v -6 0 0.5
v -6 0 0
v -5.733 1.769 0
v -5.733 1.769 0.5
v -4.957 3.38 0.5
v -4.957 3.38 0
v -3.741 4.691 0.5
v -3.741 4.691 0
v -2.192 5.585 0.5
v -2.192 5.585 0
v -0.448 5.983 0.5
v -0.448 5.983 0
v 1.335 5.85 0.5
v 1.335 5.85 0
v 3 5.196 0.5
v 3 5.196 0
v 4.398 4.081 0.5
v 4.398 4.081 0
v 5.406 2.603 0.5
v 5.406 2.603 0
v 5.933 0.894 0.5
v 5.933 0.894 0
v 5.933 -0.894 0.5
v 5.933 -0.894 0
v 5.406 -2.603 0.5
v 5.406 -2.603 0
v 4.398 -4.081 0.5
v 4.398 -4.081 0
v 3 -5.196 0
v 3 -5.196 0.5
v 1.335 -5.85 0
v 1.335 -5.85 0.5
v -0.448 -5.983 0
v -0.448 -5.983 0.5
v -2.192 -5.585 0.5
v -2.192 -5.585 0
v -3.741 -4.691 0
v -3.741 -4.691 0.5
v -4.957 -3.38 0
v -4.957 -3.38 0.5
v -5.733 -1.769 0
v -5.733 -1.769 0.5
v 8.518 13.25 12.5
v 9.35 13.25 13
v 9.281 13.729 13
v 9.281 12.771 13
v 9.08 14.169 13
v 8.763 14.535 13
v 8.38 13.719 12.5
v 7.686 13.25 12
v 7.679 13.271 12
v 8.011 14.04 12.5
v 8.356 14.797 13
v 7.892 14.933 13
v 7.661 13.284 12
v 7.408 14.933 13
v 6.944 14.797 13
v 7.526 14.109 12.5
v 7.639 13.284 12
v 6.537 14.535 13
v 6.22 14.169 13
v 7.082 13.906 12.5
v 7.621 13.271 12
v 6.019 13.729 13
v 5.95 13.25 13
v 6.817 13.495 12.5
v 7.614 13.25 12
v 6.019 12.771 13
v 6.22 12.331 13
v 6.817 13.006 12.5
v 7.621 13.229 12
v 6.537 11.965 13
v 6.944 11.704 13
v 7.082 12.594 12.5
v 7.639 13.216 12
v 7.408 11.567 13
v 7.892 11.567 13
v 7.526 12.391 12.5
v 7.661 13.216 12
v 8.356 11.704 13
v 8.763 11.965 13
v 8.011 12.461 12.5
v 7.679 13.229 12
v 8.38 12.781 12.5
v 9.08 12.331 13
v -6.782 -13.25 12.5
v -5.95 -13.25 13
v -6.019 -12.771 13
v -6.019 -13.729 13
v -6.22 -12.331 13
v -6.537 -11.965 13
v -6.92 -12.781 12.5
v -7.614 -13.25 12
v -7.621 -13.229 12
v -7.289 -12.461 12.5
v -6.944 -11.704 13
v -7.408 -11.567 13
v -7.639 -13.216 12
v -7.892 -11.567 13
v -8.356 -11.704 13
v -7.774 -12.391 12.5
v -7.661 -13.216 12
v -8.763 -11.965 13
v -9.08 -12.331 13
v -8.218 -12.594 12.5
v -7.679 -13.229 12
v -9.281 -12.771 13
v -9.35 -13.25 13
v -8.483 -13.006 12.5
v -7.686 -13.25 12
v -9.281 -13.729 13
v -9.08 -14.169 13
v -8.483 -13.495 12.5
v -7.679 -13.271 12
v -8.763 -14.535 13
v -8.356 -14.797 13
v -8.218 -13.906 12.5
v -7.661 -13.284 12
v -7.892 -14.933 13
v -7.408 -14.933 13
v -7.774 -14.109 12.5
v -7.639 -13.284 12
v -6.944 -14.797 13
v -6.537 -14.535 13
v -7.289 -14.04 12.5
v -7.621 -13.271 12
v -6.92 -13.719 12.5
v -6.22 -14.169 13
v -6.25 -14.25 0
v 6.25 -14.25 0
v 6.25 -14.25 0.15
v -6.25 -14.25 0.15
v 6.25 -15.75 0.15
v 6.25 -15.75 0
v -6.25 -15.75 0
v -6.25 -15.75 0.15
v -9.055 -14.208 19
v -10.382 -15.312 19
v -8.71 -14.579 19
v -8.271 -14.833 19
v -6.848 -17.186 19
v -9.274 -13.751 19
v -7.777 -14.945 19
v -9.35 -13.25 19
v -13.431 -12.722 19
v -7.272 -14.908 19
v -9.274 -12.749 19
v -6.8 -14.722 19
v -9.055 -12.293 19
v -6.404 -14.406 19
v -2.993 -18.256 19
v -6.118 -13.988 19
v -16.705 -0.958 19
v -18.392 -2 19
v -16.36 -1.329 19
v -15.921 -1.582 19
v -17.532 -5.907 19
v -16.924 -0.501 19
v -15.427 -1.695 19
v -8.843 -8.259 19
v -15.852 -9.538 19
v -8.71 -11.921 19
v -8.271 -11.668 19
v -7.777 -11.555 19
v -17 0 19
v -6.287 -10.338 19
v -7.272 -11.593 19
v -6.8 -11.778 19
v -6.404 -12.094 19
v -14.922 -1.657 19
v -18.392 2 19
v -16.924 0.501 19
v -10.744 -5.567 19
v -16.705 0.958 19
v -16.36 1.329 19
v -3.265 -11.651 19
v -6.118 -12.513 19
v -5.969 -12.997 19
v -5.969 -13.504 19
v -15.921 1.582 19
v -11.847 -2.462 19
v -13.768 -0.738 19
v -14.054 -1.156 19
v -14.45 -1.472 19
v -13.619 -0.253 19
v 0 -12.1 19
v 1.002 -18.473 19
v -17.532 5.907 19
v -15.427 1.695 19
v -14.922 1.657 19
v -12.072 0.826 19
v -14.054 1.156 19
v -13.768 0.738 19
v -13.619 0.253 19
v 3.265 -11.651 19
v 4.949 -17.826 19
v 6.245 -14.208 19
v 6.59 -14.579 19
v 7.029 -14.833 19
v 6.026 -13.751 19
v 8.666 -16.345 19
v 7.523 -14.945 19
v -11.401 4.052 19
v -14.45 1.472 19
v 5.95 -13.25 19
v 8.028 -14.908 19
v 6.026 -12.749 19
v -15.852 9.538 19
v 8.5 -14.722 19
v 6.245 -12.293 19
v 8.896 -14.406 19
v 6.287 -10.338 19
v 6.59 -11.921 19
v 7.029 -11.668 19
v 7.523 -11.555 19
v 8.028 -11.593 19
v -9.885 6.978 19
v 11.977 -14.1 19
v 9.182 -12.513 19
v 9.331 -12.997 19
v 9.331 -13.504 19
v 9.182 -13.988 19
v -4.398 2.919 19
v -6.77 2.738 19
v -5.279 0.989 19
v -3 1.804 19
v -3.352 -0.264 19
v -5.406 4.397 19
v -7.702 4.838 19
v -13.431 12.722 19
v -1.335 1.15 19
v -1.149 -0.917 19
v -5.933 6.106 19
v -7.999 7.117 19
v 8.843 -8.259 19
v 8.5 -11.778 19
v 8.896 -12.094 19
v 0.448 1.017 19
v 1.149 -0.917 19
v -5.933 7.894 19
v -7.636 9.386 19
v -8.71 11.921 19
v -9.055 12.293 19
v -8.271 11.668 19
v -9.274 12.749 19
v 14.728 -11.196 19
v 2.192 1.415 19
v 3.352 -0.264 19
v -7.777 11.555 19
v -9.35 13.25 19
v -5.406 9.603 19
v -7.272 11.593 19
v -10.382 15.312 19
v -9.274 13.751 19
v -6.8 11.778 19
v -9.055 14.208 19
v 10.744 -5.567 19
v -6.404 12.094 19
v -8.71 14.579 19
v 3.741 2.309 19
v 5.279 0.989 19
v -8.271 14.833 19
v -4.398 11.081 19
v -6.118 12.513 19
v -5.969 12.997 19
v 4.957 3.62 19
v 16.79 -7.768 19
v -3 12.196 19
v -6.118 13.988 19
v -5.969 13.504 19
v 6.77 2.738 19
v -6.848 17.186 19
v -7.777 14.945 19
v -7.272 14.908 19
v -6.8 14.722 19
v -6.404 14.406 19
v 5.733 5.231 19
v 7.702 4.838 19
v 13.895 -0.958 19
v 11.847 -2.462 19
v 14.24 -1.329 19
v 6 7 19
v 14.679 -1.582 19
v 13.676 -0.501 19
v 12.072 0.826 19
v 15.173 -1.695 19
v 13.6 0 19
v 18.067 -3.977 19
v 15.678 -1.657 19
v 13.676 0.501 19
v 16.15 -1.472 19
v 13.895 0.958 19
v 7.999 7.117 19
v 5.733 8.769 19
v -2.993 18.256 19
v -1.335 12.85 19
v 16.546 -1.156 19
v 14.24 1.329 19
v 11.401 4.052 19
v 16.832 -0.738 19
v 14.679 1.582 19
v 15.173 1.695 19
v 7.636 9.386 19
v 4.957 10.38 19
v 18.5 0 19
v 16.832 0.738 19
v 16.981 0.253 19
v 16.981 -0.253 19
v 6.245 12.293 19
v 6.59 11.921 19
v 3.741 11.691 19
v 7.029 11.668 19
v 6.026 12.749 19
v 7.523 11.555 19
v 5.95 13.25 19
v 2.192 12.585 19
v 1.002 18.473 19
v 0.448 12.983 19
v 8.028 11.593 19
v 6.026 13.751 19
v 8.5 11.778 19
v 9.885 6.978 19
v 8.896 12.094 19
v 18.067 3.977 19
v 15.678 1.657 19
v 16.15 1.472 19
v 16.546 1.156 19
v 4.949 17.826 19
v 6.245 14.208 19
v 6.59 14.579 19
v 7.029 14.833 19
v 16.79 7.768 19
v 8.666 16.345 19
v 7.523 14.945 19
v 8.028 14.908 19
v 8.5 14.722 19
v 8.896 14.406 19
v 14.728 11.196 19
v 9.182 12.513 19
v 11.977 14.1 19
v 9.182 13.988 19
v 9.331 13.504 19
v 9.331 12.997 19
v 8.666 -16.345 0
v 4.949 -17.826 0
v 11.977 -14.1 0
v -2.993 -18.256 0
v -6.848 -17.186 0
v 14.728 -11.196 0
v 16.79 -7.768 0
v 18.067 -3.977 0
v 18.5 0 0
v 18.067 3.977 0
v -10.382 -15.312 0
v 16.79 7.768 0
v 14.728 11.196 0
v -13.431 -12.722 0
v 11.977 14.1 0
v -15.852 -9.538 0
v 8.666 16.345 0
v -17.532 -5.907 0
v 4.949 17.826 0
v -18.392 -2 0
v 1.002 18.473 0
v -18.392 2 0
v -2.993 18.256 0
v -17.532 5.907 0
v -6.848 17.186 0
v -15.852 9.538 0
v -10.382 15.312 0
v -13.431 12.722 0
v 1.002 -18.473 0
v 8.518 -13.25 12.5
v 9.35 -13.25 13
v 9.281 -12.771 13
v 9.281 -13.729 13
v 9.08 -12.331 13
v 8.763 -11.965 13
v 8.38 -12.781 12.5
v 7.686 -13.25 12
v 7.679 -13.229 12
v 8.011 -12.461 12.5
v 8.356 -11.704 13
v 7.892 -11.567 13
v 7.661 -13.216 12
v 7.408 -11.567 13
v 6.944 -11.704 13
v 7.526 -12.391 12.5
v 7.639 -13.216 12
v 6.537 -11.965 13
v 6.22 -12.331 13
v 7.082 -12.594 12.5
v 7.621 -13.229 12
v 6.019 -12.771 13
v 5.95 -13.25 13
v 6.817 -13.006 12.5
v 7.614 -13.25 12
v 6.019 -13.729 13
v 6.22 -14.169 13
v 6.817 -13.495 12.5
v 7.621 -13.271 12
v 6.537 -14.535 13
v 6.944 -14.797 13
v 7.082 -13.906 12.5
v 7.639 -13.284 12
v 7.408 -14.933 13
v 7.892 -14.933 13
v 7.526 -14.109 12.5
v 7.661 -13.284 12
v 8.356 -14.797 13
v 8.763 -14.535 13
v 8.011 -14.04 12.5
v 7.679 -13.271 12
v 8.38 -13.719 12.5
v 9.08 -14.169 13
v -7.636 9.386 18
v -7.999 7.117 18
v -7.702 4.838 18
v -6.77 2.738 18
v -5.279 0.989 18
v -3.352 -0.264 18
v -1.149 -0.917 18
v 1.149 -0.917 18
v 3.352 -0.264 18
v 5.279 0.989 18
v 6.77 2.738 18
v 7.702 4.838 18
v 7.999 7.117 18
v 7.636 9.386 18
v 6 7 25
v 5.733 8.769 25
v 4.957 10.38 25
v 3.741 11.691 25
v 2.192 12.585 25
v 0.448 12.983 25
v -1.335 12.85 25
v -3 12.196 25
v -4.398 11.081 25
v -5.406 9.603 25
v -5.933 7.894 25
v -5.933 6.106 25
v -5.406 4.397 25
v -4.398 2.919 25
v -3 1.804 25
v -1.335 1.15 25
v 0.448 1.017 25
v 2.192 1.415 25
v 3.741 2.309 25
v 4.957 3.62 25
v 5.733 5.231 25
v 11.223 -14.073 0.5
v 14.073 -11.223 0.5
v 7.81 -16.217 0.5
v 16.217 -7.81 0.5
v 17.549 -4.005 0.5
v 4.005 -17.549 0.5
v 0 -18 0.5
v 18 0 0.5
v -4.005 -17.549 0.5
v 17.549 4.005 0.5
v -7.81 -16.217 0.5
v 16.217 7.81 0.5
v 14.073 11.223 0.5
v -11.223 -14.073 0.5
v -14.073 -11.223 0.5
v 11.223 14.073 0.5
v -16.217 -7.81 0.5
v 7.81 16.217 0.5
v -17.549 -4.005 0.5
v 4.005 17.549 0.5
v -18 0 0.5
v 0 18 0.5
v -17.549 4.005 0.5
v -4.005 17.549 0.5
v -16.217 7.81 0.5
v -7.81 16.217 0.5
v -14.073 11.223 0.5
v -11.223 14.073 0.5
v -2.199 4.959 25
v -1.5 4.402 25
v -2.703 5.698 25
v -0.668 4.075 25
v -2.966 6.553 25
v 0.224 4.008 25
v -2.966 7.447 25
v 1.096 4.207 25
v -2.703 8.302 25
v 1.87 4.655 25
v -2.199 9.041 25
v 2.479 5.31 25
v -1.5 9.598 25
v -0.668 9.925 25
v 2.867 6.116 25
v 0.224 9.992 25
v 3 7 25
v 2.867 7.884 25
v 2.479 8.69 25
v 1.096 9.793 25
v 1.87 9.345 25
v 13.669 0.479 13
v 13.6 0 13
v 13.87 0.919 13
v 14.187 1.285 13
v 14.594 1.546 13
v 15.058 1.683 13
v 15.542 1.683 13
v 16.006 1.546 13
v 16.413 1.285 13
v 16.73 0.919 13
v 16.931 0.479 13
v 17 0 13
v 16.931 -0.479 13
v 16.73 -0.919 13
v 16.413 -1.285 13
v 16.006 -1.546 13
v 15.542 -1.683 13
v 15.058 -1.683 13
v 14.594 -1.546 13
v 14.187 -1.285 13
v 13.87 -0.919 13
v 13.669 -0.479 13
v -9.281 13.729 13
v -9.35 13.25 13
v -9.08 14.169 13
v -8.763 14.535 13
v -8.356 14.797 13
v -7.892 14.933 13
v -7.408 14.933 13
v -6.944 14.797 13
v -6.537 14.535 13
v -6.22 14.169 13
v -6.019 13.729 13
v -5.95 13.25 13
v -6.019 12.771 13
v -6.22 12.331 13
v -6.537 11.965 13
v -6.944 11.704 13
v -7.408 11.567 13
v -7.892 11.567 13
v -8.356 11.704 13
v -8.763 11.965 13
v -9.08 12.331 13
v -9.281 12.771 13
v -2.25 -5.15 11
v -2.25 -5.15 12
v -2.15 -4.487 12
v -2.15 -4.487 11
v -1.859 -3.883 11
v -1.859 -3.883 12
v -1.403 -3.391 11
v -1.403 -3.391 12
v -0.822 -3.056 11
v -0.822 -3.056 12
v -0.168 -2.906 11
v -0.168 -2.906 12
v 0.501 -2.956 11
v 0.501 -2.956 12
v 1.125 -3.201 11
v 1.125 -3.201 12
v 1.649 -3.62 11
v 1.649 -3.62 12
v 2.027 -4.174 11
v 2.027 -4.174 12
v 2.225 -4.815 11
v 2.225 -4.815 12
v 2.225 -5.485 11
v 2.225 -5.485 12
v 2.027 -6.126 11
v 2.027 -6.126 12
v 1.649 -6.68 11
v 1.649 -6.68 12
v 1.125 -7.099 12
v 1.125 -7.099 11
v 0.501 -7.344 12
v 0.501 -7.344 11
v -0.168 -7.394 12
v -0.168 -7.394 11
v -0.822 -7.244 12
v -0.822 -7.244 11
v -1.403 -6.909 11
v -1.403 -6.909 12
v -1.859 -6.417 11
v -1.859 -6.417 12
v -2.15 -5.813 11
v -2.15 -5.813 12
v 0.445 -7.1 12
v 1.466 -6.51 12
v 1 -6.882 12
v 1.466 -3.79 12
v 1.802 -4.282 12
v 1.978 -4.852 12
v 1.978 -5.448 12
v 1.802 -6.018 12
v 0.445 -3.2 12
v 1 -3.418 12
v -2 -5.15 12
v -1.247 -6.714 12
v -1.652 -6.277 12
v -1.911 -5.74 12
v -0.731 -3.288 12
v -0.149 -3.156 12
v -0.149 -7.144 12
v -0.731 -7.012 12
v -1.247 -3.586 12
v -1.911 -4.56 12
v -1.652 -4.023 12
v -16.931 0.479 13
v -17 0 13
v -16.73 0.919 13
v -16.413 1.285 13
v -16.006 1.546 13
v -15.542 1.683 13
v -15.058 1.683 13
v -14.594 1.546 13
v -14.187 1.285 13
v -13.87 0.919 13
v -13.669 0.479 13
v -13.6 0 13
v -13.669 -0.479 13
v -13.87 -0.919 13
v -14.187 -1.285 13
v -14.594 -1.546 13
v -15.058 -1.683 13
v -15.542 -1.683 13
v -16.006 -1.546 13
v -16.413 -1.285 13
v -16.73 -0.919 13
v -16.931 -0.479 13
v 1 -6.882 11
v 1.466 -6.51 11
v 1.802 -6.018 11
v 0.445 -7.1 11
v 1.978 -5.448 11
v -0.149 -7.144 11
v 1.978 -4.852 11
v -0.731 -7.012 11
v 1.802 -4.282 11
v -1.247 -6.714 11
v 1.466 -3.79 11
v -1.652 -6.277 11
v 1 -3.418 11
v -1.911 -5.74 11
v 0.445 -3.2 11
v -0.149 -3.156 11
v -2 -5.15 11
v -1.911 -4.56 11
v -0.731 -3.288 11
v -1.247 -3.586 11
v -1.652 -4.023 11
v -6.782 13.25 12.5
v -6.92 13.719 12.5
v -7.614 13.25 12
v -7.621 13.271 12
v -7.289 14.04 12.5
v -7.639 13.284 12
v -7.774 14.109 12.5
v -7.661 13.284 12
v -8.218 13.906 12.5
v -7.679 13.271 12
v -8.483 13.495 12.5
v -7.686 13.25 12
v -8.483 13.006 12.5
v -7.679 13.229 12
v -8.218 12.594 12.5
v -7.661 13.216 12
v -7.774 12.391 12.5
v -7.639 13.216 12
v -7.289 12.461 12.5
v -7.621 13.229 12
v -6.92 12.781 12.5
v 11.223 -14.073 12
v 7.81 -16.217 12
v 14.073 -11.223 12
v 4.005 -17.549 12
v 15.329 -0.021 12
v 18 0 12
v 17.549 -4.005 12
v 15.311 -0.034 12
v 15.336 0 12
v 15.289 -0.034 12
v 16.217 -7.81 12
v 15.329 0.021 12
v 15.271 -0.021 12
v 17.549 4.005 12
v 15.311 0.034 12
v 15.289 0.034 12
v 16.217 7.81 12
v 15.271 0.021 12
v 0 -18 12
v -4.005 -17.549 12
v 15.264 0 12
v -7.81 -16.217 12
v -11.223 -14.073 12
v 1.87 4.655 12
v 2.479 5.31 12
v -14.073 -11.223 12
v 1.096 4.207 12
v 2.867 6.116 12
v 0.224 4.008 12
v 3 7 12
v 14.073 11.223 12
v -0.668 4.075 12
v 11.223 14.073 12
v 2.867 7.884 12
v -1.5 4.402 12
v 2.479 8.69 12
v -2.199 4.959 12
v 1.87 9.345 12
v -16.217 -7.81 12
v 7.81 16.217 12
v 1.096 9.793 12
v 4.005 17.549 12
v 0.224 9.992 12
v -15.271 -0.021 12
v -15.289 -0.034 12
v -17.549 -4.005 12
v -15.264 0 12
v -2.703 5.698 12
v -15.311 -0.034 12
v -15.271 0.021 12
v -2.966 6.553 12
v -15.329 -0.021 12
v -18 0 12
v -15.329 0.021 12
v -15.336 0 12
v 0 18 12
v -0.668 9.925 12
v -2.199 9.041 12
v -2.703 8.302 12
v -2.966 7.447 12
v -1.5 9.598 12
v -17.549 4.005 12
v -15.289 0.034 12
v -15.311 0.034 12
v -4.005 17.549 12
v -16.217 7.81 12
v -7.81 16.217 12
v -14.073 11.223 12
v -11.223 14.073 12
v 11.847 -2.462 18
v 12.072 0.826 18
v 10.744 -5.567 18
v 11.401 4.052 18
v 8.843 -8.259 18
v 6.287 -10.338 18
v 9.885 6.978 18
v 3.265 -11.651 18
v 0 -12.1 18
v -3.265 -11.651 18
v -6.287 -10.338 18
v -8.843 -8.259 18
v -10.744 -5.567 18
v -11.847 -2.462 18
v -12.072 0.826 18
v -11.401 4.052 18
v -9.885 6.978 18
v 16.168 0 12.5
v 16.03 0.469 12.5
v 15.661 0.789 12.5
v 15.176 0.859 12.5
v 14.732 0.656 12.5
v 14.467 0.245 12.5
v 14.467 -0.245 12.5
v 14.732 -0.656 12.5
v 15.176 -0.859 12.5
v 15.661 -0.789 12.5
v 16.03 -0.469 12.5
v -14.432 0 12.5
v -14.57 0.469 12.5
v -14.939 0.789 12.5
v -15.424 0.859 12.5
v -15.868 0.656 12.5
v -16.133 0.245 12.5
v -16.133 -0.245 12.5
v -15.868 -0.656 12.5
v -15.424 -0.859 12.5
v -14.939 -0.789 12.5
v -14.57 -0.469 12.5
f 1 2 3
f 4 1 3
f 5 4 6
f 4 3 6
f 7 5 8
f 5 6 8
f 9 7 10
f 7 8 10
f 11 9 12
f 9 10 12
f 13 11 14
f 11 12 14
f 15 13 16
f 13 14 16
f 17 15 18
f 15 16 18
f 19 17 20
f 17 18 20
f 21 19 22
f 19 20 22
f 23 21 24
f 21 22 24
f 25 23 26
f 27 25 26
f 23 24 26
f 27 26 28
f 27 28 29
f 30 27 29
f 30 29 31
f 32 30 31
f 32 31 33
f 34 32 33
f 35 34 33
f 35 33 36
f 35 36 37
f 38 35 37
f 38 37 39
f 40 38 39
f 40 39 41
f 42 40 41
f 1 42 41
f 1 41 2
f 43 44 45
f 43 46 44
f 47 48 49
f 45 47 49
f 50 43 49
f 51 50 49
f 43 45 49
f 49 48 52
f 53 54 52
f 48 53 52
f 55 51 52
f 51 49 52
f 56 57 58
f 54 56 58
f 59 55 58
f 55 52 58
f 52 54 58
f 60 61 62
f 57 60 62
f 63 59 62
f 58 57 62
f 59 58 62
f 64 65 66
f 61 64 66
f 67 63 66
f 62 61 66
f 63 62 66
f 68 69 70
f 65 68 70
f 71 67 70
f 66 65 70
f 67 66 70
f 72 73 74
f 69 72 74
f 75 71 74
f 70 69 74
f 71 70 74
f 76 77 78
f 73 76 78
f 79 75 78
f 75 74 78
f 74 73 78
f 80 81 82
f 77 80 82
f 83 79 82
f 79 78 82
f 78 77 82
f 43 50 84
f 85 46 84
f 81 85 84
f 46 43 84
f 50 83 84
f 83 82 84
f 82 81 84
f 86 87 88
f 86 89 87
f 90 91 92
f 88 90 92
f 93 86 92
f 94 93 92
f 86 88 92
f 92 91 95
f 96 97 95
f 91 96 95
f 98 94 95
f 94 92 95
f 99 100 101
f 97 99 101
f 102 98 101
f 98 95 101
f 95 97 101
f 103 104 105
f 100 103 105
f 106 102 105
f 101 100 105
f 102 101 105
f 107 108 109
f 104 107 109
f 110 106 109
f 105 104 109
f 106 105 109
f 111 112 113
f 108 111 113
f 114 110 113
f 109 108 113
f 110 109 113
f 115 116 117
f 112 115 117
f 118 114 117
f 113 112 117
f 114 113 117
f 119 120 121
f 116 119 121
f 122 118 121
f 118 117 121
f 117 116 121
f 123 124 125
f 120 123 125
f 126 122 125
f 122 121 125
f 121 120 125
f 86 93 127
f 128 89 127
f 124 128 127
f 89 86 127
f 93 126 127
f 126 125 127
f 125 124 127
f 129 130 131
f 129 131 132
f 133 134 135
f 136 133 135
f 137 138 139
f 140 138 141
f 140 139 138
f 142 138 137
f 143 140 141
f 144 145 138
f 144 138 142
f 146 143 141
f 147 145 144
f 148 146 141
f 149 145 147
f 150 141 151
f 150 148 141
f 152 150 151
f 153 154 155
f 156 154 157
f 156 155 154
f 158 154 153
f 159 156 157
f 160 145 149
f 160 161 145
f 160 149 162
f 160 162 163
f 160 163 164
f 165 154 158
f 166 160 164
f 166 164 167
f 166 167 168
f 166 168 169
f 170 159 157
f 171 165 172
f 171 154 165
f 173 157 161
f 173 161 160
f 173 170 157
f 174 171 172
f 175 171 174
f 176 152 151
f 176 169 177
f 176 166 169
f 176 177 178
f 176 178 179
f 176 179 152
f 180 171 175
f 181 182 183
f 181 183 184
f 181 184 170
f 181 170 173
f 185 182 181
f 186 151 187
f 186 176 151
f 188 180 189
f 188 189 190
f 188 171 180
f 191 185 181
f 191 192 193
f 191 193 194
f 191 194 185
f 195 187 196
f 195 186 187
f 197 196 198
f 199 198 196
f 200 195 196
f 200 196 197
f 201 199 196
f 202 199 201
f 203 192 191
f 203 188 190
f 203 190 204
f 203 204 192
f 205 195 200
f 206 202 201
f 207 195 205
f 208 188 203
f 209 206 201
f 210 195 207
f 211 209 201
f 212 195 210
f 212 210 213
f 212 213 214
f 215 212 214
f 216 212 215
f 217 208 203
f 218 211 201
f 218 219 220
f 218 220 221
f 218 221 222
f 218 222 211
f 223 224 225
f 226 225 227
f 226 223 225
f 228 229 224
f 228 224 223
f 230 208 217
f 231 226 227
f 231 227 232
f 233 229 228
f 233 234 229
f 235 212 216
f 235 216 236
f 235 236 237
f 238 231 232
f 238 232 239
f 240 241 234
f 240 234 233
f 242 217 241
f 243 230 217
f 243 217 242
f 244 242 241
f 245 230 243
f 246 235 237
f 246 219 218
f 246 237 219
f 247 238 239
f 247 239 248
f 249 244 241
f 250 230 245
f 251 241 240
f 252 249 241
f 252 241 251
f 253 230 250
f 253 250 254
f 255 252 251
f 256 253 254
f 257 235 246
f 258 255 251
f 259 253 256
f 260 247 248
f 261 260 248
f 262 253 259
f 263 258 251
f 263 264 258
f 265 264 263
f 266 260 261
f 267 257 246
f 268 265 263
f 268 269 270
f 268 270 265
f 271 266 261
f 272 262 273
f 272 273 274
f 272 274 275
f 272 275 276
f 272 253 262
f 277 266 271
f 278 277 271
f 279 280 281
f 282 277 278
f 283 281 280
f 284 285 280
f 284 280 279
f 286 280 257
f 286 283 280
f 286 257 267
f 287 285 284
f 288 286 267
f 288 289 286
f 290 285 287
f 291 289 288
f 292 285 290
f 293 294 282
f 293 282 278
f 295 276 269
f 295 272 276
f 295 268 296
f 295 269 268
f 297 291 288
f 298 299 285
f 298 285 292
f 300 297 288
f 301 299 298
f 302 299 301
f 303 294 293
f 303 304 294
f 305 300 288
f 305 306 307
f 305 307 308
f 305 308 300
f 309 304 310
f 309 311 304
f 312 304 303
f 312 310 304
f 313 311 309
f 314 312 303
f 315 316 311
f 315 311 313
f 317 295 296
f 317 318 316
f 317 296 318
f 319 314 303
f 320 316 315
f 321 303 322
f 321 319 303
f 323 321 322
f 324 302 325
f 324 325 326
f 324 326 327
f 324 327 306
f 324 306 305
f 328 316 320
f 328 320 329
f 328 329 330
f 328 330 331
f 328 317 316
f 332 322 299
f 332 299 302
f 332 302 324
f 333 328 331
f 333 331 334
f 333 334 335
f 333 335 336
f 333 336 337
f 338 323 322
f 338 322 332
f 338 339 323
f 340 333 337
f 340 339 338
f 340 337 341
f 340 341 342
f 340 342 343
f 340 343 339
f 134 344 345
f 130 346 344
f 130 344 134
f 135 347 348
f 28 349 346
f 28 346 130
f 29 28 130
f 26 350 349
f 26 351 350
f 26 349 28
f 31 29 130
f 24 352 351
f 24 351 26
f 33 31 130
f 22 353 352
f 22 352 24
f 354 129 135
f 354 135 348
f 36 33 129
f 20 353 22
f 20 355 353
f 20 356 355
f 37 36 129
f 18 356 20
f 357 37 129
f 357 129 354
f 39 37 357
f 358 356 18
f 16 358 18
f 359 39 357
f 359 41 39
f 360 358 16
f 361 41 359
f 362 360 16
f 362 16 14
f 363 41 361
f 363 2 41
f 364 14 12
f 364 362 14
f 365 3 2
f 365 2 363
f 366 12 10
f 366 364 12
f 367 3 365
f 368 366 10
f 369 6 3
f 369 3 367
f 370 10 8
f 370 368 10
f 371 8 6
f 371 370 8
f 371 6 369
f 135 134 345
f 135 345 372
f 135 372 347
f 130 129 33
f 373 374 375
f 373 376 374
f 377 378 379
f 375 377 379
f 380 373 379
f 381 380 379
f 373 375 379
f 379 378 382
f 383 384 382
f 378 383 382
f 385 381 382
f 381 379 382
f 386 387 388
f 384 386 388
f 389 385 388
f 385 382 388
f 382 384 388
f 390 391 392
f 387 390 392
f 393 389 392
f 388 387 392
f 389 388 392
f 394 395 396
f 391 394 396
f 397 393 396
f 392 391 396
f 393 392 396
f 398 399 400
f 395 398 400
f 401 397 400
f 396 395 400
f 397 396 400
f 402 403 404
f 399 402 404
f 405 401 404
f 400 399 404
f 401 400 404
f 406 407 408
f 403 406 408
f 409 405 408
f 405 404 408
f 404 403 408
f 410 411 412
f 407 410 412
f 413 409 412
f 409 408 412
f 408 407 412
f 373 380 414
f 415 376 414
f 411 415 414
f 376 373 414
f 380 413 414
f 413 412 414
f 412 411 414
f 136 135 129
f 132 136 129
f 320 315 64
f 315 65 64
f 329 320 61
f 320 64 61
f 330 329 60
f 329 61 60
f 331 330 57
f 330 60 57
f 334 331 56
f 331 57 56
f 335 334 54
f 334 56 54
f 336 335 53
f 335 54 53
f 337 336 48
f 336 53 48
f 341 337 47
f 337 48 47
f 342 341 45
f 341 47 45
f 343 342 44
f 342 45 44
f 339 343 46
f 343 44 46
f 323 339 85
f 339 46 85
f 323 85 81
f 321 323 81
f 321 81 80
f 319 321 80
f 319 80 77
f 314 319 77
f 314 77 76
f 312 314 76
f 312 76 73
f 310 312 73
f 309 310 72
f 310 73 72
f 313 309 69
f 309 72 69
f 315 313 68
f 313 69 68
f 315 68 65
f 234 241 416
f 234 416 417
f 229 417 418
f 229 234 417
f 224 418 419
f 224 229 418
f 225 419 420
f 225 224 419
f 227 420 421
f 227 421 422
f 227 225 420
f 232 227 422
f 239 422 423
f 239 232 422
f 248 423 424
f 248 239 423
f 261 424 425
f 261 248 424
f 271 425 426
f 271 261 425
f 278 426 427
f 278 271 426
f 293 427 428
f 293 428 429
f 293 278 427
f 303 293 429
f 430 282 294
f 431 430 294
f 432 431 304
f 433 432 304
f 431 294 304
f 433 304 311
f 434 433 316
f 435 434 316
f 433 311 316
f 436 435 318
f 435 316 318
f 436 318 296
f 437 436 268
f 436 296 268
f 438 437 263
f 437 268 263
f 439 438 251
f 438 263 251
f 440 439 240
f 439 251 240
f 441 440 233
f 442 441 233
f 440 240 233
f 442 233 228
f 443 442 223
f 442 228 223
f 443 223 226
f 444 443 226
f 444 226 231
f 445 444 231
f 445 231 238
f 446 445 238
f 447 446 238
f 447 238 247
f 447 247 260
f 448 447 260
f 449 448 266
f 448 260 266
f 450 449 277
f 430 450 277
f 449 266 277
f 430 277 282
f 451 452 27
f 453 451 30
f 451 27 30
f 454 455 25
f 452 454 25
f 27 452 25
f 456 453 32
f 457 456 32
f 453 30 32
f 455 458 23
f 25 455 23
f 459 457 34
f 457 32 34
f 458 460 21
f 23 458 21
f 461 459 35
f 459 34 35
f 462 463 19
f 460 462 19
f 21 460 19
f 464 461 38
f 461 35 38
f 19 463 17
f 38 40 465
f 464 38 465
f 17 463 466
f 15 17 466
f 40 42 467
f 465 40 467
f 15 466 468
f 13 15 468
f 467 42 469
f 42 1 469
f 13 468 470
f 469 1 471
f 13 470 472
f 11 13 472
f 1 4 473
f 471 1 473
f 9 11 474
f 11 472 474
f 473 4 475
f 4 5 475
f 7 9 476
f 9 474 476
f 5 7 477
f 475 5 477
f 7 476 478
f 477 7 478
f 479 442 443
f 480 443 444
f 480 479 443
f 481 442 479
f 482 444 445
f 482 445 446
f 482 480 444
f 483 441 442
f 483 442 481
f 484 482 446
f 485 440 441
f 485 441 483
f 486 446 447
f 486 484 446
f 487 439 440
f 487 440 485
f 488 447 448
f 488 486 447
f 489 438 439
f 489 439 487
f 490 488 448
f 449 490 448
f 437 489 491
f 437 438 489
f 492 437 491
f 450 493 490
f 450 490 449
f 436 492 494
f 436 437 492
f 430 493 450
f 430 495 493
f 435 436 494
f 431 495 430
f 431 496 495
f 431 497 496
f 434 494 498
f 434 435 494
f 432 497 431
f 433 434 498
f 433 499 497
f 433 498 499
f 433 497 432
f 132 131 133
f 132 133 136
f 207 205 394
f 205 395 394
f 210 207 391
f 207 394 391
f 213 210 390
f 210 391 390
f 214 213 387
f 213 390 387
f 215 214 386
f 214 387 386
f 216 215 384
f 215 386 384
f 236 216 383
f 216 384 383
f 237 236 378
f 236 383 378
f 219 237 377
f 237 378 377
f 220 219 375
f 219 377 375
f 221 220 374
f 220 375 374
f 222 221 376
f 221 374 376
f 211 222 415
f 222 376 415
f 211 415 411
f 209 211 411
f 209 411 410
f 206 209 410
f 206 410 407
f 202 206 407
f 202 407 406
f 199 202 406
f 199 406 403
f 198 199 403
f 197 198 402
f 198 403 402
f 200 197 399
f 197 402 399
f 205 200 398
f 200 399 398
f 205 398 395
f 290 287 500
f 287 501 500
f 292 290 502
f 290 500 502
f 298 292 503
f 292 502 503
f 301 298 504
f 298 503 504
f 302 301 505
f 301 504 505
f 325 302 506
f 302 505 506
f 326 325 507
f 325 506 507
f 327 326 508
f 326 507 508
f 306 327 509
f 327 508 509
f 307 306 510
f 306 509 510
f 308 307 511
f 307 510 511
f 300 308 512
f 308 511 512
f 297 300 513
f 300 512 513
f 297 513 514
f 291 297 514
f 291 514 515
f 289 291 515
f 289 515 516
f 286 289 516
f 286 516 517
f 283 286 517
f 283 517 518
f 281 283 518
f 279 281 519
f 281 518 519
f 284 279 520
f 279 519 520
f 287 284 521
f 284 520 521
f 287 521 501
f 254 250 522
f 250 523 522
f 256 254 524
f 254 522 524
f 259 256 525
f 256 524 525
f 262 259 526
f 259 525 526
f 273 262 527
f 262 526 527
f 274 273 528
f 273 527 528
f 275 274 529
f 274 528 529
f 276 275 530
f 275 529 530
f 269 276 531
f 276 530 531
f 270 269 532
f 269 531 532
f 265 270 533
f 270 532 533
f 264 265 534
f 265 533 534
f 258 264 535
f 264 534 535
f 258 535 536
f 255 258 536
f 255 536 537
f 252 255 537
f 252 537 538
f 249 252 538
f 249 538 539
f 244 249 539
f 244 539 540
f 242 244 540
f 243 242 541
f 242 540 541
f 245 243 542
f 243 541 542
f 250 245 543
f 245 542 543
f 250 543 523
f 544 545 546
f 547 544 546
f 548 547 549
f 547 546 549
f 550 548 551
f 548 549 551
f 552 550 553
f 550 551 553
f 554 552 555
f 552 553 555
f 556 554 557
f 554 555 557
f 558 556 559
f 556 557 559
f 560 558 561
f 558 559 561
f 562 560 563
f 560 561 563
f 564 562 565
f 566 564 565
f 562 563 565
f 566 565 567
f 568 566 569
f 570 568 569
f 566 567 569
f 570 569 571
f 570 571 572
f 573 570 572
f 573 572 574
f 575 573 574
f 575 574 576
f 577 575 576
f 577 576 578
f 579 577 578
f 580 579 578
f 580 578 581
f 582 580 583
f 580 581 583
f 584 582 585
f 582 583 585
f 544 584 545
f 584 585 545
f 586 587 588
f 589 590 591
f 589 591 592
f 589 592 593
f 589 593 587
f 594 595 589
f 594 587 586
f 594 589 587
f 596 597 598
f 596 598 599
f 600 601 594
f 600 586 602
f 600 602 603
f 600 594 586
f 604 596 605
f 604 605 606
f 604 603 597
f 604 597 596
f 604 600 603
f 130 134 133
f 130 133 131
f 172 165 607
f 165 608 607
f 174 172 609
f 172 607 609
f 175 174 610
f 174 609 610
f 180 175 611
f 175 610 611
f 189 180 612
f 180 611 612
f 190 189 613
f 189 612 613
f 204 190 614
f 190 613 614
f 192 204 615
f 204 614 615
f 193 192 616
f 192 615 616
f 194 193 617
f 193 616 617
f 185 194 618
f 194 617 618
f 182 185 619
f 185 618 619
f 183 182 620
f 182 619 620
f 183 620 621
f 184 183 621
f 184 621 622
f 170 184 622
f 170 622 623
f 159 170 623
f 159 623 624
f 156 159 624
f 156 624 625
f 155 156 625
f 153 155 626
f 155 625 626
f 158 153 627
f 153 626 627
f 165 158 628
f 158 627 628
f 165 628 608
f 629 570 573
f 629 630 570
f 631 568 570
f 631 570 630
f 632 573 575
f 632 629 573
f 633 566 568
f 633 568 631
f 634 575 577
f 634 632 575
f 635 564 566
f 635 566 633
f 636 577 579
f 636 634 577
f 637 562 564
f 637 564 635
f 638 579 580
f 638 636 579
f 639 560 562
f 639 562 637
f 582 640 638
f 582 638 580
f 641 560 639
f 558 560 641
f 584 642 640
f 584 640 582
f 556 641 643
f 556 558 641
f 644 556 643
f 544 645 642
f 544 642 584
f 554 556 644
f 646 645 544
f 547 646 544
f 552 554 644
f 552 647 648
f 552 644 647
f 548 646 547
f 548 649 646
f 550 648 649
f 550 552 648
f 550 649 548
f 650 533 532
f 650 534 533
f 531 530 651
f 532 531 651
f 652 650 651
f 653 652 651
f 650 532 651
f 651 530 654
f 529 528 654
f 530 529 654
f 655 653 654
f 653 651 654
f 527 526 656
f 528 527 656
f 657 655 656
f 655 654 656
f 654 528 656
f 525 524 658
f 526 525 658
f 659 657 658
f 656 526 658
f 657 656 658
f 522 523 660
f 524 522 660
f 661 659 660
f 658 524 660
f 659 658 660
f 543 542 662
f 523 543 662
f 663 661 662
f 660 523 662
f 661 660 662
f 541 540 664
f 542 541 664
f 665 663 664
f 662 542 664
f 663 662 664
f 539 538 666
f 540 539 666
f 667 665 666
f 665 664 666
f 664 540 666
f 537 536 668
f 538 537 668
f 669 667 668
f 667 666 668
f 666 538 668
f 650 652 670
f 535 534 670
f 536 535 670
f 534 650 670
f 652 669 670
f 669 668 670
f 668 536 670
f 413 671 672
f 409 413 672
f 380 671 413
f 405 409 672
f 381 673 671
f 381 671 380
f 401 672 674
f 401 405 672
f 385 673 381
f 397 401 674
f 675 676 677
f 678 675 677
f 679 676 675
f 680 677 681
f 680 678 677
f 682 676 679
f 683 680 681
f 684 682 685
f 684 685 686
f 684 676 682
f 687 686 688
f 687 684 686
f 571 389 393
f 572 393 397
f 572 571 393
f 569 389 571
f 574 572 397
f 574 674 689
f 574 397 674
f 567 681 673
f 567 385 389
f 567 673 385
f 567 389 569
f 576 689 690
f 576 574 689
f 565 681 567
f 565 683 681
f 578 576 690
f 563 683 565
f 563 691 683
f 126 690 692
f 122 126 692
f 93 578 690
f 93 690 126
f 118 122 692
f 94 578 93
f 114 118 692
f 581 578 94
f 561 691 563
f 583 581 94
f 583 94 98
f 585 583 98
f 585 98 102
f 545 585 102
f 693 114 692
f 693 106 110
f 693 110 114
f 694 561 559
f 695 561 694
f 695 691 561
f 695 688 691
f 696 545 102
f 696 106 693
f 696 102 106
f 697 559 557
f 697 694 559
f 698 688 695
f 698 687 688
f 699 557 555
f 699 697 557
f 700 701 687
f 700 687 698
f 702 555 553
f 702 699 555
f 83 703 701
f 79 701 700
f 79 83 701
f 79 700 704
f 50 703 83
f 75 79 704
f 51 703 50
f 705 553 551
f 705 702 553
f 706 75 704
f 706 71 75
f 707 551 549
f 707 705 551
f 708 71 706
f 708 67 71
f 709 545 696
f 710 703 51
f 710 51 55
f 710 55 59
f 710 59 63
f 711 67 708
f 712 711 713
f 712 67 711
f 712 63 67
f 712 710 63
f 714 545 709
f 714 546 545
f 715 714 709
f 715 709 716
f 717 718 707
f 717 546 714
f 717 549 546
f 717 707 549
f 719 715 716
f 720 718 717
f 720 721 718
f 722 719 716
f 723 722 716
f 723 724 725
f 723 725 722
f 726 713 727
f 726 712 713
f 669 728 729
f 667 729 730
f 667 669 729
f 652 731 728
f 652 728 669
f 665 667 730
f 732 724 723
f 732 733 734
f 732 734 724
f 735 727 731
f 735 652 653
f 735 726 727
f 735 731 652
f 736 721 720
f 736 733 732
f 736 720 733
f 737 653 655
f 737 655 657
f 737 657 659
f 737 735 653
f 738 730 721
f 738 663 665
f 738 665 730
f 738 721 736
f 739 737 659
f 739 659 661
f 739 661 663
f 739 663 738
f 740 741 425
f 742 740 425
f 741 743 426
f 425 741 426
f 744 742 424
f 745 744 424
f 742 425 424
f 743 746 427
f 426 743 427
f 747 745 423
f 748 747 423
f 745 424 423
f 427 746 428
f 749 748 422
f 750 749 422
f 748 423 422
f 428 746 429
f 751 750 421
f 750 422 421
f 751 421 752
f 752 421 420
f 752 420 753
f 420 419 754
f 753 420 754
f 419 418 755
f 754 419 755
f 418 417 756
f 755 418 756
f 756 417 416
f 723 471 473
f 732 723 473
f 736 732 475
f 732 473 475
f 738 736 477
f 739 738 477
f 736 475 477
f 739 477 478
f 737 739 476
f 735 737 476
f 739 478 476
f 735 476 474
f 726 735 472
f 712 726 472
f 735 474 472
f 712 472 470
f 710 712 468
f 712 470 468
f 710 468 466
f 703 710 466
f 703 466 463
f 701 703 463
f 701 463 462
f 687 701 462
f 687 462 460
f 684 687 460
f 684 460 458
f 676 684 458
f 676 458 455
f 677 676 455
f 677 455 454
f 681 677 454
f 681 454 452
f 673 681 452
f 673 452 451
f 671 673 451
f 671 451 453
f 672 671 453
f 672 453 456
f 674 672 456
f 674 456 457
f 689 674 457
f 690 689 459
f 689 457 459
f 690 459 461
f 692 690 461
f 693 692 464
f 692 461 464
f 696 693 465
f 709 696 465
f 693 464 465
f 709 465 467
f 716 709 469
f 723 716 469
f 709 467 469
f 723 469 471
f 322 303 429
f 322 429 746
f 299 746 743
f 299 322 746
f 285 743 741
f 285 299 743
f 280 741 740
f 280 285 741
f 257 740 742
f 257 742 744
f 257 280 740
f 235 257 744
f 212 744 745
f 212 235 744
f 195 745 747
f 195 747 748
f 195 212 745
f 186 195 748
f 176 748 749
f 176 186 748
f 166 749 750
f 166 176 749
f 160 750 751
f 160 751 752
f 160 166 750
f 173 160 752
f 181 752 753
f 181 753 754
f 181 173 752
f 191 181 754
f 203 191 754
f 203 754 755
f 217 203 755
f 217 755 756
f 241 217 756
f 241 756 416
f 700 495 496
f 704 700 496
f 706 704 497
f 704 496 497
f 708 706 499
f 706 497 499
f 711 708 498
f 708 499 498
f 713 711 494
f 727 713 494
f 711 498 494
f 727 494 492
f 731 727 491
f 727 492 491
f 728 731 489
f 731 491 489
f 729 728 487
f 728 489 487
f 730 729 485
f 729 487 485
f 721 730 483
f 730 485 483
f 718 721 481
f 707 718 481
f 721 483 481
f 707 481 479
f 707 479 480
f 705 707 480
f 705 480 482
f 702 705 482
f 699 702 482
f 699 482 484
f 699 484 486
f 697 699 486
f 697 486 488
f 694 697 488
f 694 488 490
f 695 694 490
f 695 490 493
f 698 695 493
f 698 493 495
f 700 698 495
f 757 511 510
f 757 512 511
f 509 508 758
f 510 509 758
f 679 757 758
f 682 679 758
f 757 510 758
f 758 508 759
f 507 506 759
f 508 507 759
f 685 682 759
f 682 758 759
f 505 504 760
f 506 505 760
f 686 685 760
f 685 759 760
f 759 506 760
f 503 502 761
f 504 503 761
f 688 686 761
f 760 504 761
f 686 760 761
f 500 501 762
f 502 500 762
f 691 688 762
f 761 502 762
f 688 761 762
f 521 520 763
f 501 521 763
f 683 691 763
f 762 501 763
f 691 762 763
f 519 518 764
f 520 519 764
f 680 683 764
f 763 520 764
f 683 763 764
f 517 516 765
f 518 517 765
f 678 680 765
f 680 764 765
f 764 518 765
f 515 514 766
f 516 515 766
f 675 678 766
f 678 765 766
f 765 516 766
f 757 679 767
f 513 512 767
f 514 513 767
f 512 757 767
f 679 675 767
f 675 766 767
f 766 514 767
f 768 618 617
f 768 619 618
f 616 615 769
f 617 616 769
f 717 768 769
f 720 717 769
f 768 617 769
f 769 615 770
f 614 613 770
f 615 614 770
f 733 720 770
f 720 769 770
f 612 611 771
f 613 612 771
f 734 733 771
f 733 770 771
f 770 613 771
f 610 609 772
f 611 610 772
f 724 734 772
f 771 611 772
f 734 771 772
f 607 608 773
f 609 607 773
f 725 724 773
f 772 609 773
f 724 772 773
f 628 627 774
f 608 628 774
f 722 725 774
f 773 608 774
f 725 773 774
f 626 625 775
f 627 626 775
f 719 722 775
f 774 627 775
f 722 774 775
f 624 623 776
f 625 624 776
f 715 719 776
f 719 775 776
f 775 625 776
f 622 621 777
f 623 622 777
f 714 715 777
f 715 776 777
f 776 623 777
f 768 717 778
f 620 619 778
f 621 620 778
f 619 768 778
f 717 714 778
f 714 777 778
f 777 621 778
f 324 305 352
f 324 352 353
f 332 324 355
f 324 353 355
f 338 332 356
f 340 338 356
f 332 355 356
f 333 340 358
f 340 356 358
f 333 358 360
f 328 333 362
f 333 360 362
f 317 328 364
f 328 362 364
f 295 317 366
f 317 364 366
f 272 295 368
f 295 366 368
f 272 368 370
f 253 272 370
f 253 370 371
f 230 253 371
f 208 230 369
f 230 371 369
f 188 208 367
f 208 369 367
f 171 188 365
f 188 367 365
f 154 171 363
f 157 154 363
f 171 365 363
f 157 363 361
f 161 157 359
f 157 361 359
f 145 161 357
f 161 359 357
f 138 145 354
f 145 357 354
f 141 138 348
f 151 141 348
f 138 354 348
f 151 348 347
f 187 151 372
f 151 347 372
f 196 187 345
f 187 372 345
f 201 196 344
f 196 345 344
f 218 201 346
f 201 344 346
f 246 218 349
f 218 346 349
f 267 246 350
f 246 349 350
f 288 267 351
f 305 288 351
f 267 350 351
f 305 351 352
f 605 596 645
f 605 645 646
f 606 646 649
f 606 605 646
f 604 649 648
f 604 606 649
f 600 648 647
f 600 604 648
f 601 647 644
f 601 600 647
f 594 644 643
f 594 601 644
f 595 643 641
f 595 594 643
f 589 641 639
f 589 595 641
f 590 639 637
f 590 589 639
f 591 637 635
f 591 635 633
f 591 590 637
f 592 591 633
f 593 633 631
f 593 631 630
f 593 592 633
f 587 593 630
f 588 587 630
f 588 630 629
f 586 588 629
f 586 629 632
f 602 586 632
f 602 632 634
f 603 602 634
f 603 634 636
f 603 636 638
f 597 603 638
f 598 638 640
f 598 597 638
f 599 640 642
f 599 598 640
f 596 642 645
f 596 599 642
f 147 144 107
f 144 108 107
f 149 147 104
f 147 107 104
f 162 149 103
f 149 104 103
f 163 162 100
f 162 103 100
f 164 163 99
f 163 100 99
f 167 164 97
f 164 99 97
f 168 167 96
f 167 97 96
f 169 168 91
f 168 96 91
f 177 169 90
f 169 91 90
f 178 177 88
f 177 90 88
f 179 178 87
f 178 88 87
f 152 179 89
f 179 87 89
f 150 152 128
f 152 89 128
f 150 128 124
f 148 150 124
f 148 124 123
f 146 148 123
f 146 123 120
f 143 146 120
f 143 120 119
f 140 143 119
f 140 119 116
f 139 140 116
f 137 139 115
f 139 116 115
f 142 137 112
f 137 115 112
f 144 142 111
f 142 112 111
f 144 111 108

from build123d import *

# Parameters (mm, degrees)
SKETCH1_R                        = 18.5
BOSS_EXTRUDE1_DEPTH              = 19
SKETCH4_R                        = 6
BOSS_EXTRUDE4_DEPTH              = 6
CUT_EXTRUDE2_DEPTH               = 1
TALADRO_DE_MARGEN_PARA_M31_D     = 3.4
TALADRO_DE_MARGEN_PARA_M31_DEPTH = 6
TALADRO_DE_MARGEN_PARA_M31_TIP   = 1.021463052
CROQUIS1_R                       = 18
CORTAR_EXTRUIR2_DEPTH            = 12
CORTAR_EXTRUIR3_REACH            = 38.187
CROQUIS2_R                       = 3
CROQUIS3_R                       = 18
SALIENTE_EXTRUIR1_DEPTH          = 0.5
SKETCH11_R                       = 2
CUT_EXTRUDE3_DEPTH               = 10
SKETCH12_W                       = 12.5
SKETCH12_H                       = 1.5
CUT_EXTRUDE4_DEPTH               = 0.15
SKETCH13_R                       = 6
CUT_EXTRUDE5_DEPTH               = 10
SKETCH14_R                       = 2.25
SKETCH14_R_2                     = 2
BOSS_EXTRUDE5_DEPTH              = 1


with BuildPart() as part:
    # Sketch1 → Boss-Extrude1 (new body)
    with BuildSketch(Plane.XY):
        Circle(SKETCH1_R)
    extrude(amount=BOSS_EXTRUDE1_DEPTH)

    # Sketch4 → Boss-Extrude4 (add)
    with BuildSketch(Plane.XY.offset(19)):
        with Locations((0, 7)):
            Circle(SKETCH4_R)
    extrude(amount=BOSS_EXTRUDE4_DEPTH)

    # Sketch8 → Cut-Extrude2 (cut)
    with BuildSketch(Plane.XY.offset(19)):
        with BuildLine():
            ThreePointArc((7.635768375, 9.386428571), (0, -12.1), (-7.635768375, 9.386428571))
            ThreePointArc((-7.635768375, 9.386428571), (0, -1), (7.635768375, 9.386428571))
        make_face()
    extrude(amount=-CUT_EXTRUDE2_DEPTH, mode=Mode.SUBTRACT)

    # Taladro de margen para M31
    with Locations(Plane.XY.offset(19)):
        with Locations((7.65, -13.250188678), (-7.65, -13.250188678), (-15.3, 0), (-7.65, 13.250188678), (15.3, 0), (7.65, 13.250188678)):
            Hole(TALADRO_DE_MARGEN_PARA_M31_D / 2, depth=TALADRO_DE_MARGEN_PARA_M31_DEPTH)
            with Locations((0, 0, -(TALADRO_DE_MARGEN_PARA_M31_DEPTH + TALADRO_DE_MARGEN_PARA_M31_TIP / 2))):  # 118° drill point
                Cone(0, TALADRO_DE_MARGEN_PARA_M31_D / 2, TALADRO_DE_MARGEN_PARA_M31_TIP, mode=Mode.SUBTRACT)

    # Croquis1 → Cortar-Extruir2 (cut)
    with BuildSketch(Plane(origin=(0, 0, 0), x_dir=(-1, 0, 0), z_dir=(0, 0, -1))):
        Circle(CROQUIS1_R)
    extrude(amount=-CORTAR_EXTRUIR2_DEPTH, mode=Mode.SUBTRACT)

    # Croquis2 → Cortar-Extruir3 (cut, up to next)
    with BuildSketch(Plane.XY.offset(25), mode=Mode.PRIVATE) as cortar_extruir3_sk1:
        with Locations((0, 7)):
            Circle(CROQUIS2_R)
    cortar_extruir3_tool1 = extrude(cortar_extruir3_sk1.sketch, amount=-CORTAR_EXTRUIR3_REACH, mode=Mode.PRIVATE) & part.part
    add(cortar_extruir3_tool1.solids().sort_by_distance((0, 7, 25))[0], mode=Mode.SUBTRACT)

    # Croquis3 → Saliente-Extruir1 (add)
    with BuildSketch(Plane(origin=(0, 0, 0), x_dir=(-1, 0, 0), z_dir=(0, 0, -1))):
        Circle(CROQUIS3_R)
    extrude(amount=-SALIENTE_EXTRUIR1_DEPTH)

    # Sketch11 → Cut-Extrude3 (cut)
    with BuildSketch(Plane(origin=(0, 0, 0), x_dir=(-1, 0, 0), z_dir=(0, 0, -1))):
        Circle(SKETCH11_R)
    extrude(amount=-CUT_EXTRUDE3_DEPTH, mode=Mode.SUBTRACT)

    # Sketch12 → Cut-Extrude4 (cut)
    with BuildSketch(Plane(origin=(0, 0, 0), x_dir=(-1, 0, 0), z_dir=(0, 0, -1))):
        with Locations((0, -15)):
            Rectangle(SKETCH12_W, SKETCH12_H)
    extrude(amount=-CUT_EXTRUDE4_DEPTH, mode=Mode.SUBTRACT)

    # Sketch13 → Cut-Extrude5 (cut)
    with BuildSketch(Plane(origin=(0, 0, 0), x_dir=(-1, 0, 0), z_dir=(0, 0, -1))):
        Circle(SKETCH13_R)
    extrude(amount=-CUT_EXTRUDE5_DEPTH, mode=Mode.SUBTRACT)

    # Sketch14 → Boss-Extrude5 (add)
    with BuildSketch(Plane(origin=(0, 0, 12), x_dir=(-1, 0, 0), z_dir=(0, 0, -1))):
        with Locations((0, -5.15)):
            Circle(SKETCH14_R)
        with Locations((0, -5.15)):
            Circle(SKETCH14_R_2, mode=Mode.SUBTRACT)
    extrude(amount=BOSS_EXTRUDE5_DEPTH)


solid = part.part
